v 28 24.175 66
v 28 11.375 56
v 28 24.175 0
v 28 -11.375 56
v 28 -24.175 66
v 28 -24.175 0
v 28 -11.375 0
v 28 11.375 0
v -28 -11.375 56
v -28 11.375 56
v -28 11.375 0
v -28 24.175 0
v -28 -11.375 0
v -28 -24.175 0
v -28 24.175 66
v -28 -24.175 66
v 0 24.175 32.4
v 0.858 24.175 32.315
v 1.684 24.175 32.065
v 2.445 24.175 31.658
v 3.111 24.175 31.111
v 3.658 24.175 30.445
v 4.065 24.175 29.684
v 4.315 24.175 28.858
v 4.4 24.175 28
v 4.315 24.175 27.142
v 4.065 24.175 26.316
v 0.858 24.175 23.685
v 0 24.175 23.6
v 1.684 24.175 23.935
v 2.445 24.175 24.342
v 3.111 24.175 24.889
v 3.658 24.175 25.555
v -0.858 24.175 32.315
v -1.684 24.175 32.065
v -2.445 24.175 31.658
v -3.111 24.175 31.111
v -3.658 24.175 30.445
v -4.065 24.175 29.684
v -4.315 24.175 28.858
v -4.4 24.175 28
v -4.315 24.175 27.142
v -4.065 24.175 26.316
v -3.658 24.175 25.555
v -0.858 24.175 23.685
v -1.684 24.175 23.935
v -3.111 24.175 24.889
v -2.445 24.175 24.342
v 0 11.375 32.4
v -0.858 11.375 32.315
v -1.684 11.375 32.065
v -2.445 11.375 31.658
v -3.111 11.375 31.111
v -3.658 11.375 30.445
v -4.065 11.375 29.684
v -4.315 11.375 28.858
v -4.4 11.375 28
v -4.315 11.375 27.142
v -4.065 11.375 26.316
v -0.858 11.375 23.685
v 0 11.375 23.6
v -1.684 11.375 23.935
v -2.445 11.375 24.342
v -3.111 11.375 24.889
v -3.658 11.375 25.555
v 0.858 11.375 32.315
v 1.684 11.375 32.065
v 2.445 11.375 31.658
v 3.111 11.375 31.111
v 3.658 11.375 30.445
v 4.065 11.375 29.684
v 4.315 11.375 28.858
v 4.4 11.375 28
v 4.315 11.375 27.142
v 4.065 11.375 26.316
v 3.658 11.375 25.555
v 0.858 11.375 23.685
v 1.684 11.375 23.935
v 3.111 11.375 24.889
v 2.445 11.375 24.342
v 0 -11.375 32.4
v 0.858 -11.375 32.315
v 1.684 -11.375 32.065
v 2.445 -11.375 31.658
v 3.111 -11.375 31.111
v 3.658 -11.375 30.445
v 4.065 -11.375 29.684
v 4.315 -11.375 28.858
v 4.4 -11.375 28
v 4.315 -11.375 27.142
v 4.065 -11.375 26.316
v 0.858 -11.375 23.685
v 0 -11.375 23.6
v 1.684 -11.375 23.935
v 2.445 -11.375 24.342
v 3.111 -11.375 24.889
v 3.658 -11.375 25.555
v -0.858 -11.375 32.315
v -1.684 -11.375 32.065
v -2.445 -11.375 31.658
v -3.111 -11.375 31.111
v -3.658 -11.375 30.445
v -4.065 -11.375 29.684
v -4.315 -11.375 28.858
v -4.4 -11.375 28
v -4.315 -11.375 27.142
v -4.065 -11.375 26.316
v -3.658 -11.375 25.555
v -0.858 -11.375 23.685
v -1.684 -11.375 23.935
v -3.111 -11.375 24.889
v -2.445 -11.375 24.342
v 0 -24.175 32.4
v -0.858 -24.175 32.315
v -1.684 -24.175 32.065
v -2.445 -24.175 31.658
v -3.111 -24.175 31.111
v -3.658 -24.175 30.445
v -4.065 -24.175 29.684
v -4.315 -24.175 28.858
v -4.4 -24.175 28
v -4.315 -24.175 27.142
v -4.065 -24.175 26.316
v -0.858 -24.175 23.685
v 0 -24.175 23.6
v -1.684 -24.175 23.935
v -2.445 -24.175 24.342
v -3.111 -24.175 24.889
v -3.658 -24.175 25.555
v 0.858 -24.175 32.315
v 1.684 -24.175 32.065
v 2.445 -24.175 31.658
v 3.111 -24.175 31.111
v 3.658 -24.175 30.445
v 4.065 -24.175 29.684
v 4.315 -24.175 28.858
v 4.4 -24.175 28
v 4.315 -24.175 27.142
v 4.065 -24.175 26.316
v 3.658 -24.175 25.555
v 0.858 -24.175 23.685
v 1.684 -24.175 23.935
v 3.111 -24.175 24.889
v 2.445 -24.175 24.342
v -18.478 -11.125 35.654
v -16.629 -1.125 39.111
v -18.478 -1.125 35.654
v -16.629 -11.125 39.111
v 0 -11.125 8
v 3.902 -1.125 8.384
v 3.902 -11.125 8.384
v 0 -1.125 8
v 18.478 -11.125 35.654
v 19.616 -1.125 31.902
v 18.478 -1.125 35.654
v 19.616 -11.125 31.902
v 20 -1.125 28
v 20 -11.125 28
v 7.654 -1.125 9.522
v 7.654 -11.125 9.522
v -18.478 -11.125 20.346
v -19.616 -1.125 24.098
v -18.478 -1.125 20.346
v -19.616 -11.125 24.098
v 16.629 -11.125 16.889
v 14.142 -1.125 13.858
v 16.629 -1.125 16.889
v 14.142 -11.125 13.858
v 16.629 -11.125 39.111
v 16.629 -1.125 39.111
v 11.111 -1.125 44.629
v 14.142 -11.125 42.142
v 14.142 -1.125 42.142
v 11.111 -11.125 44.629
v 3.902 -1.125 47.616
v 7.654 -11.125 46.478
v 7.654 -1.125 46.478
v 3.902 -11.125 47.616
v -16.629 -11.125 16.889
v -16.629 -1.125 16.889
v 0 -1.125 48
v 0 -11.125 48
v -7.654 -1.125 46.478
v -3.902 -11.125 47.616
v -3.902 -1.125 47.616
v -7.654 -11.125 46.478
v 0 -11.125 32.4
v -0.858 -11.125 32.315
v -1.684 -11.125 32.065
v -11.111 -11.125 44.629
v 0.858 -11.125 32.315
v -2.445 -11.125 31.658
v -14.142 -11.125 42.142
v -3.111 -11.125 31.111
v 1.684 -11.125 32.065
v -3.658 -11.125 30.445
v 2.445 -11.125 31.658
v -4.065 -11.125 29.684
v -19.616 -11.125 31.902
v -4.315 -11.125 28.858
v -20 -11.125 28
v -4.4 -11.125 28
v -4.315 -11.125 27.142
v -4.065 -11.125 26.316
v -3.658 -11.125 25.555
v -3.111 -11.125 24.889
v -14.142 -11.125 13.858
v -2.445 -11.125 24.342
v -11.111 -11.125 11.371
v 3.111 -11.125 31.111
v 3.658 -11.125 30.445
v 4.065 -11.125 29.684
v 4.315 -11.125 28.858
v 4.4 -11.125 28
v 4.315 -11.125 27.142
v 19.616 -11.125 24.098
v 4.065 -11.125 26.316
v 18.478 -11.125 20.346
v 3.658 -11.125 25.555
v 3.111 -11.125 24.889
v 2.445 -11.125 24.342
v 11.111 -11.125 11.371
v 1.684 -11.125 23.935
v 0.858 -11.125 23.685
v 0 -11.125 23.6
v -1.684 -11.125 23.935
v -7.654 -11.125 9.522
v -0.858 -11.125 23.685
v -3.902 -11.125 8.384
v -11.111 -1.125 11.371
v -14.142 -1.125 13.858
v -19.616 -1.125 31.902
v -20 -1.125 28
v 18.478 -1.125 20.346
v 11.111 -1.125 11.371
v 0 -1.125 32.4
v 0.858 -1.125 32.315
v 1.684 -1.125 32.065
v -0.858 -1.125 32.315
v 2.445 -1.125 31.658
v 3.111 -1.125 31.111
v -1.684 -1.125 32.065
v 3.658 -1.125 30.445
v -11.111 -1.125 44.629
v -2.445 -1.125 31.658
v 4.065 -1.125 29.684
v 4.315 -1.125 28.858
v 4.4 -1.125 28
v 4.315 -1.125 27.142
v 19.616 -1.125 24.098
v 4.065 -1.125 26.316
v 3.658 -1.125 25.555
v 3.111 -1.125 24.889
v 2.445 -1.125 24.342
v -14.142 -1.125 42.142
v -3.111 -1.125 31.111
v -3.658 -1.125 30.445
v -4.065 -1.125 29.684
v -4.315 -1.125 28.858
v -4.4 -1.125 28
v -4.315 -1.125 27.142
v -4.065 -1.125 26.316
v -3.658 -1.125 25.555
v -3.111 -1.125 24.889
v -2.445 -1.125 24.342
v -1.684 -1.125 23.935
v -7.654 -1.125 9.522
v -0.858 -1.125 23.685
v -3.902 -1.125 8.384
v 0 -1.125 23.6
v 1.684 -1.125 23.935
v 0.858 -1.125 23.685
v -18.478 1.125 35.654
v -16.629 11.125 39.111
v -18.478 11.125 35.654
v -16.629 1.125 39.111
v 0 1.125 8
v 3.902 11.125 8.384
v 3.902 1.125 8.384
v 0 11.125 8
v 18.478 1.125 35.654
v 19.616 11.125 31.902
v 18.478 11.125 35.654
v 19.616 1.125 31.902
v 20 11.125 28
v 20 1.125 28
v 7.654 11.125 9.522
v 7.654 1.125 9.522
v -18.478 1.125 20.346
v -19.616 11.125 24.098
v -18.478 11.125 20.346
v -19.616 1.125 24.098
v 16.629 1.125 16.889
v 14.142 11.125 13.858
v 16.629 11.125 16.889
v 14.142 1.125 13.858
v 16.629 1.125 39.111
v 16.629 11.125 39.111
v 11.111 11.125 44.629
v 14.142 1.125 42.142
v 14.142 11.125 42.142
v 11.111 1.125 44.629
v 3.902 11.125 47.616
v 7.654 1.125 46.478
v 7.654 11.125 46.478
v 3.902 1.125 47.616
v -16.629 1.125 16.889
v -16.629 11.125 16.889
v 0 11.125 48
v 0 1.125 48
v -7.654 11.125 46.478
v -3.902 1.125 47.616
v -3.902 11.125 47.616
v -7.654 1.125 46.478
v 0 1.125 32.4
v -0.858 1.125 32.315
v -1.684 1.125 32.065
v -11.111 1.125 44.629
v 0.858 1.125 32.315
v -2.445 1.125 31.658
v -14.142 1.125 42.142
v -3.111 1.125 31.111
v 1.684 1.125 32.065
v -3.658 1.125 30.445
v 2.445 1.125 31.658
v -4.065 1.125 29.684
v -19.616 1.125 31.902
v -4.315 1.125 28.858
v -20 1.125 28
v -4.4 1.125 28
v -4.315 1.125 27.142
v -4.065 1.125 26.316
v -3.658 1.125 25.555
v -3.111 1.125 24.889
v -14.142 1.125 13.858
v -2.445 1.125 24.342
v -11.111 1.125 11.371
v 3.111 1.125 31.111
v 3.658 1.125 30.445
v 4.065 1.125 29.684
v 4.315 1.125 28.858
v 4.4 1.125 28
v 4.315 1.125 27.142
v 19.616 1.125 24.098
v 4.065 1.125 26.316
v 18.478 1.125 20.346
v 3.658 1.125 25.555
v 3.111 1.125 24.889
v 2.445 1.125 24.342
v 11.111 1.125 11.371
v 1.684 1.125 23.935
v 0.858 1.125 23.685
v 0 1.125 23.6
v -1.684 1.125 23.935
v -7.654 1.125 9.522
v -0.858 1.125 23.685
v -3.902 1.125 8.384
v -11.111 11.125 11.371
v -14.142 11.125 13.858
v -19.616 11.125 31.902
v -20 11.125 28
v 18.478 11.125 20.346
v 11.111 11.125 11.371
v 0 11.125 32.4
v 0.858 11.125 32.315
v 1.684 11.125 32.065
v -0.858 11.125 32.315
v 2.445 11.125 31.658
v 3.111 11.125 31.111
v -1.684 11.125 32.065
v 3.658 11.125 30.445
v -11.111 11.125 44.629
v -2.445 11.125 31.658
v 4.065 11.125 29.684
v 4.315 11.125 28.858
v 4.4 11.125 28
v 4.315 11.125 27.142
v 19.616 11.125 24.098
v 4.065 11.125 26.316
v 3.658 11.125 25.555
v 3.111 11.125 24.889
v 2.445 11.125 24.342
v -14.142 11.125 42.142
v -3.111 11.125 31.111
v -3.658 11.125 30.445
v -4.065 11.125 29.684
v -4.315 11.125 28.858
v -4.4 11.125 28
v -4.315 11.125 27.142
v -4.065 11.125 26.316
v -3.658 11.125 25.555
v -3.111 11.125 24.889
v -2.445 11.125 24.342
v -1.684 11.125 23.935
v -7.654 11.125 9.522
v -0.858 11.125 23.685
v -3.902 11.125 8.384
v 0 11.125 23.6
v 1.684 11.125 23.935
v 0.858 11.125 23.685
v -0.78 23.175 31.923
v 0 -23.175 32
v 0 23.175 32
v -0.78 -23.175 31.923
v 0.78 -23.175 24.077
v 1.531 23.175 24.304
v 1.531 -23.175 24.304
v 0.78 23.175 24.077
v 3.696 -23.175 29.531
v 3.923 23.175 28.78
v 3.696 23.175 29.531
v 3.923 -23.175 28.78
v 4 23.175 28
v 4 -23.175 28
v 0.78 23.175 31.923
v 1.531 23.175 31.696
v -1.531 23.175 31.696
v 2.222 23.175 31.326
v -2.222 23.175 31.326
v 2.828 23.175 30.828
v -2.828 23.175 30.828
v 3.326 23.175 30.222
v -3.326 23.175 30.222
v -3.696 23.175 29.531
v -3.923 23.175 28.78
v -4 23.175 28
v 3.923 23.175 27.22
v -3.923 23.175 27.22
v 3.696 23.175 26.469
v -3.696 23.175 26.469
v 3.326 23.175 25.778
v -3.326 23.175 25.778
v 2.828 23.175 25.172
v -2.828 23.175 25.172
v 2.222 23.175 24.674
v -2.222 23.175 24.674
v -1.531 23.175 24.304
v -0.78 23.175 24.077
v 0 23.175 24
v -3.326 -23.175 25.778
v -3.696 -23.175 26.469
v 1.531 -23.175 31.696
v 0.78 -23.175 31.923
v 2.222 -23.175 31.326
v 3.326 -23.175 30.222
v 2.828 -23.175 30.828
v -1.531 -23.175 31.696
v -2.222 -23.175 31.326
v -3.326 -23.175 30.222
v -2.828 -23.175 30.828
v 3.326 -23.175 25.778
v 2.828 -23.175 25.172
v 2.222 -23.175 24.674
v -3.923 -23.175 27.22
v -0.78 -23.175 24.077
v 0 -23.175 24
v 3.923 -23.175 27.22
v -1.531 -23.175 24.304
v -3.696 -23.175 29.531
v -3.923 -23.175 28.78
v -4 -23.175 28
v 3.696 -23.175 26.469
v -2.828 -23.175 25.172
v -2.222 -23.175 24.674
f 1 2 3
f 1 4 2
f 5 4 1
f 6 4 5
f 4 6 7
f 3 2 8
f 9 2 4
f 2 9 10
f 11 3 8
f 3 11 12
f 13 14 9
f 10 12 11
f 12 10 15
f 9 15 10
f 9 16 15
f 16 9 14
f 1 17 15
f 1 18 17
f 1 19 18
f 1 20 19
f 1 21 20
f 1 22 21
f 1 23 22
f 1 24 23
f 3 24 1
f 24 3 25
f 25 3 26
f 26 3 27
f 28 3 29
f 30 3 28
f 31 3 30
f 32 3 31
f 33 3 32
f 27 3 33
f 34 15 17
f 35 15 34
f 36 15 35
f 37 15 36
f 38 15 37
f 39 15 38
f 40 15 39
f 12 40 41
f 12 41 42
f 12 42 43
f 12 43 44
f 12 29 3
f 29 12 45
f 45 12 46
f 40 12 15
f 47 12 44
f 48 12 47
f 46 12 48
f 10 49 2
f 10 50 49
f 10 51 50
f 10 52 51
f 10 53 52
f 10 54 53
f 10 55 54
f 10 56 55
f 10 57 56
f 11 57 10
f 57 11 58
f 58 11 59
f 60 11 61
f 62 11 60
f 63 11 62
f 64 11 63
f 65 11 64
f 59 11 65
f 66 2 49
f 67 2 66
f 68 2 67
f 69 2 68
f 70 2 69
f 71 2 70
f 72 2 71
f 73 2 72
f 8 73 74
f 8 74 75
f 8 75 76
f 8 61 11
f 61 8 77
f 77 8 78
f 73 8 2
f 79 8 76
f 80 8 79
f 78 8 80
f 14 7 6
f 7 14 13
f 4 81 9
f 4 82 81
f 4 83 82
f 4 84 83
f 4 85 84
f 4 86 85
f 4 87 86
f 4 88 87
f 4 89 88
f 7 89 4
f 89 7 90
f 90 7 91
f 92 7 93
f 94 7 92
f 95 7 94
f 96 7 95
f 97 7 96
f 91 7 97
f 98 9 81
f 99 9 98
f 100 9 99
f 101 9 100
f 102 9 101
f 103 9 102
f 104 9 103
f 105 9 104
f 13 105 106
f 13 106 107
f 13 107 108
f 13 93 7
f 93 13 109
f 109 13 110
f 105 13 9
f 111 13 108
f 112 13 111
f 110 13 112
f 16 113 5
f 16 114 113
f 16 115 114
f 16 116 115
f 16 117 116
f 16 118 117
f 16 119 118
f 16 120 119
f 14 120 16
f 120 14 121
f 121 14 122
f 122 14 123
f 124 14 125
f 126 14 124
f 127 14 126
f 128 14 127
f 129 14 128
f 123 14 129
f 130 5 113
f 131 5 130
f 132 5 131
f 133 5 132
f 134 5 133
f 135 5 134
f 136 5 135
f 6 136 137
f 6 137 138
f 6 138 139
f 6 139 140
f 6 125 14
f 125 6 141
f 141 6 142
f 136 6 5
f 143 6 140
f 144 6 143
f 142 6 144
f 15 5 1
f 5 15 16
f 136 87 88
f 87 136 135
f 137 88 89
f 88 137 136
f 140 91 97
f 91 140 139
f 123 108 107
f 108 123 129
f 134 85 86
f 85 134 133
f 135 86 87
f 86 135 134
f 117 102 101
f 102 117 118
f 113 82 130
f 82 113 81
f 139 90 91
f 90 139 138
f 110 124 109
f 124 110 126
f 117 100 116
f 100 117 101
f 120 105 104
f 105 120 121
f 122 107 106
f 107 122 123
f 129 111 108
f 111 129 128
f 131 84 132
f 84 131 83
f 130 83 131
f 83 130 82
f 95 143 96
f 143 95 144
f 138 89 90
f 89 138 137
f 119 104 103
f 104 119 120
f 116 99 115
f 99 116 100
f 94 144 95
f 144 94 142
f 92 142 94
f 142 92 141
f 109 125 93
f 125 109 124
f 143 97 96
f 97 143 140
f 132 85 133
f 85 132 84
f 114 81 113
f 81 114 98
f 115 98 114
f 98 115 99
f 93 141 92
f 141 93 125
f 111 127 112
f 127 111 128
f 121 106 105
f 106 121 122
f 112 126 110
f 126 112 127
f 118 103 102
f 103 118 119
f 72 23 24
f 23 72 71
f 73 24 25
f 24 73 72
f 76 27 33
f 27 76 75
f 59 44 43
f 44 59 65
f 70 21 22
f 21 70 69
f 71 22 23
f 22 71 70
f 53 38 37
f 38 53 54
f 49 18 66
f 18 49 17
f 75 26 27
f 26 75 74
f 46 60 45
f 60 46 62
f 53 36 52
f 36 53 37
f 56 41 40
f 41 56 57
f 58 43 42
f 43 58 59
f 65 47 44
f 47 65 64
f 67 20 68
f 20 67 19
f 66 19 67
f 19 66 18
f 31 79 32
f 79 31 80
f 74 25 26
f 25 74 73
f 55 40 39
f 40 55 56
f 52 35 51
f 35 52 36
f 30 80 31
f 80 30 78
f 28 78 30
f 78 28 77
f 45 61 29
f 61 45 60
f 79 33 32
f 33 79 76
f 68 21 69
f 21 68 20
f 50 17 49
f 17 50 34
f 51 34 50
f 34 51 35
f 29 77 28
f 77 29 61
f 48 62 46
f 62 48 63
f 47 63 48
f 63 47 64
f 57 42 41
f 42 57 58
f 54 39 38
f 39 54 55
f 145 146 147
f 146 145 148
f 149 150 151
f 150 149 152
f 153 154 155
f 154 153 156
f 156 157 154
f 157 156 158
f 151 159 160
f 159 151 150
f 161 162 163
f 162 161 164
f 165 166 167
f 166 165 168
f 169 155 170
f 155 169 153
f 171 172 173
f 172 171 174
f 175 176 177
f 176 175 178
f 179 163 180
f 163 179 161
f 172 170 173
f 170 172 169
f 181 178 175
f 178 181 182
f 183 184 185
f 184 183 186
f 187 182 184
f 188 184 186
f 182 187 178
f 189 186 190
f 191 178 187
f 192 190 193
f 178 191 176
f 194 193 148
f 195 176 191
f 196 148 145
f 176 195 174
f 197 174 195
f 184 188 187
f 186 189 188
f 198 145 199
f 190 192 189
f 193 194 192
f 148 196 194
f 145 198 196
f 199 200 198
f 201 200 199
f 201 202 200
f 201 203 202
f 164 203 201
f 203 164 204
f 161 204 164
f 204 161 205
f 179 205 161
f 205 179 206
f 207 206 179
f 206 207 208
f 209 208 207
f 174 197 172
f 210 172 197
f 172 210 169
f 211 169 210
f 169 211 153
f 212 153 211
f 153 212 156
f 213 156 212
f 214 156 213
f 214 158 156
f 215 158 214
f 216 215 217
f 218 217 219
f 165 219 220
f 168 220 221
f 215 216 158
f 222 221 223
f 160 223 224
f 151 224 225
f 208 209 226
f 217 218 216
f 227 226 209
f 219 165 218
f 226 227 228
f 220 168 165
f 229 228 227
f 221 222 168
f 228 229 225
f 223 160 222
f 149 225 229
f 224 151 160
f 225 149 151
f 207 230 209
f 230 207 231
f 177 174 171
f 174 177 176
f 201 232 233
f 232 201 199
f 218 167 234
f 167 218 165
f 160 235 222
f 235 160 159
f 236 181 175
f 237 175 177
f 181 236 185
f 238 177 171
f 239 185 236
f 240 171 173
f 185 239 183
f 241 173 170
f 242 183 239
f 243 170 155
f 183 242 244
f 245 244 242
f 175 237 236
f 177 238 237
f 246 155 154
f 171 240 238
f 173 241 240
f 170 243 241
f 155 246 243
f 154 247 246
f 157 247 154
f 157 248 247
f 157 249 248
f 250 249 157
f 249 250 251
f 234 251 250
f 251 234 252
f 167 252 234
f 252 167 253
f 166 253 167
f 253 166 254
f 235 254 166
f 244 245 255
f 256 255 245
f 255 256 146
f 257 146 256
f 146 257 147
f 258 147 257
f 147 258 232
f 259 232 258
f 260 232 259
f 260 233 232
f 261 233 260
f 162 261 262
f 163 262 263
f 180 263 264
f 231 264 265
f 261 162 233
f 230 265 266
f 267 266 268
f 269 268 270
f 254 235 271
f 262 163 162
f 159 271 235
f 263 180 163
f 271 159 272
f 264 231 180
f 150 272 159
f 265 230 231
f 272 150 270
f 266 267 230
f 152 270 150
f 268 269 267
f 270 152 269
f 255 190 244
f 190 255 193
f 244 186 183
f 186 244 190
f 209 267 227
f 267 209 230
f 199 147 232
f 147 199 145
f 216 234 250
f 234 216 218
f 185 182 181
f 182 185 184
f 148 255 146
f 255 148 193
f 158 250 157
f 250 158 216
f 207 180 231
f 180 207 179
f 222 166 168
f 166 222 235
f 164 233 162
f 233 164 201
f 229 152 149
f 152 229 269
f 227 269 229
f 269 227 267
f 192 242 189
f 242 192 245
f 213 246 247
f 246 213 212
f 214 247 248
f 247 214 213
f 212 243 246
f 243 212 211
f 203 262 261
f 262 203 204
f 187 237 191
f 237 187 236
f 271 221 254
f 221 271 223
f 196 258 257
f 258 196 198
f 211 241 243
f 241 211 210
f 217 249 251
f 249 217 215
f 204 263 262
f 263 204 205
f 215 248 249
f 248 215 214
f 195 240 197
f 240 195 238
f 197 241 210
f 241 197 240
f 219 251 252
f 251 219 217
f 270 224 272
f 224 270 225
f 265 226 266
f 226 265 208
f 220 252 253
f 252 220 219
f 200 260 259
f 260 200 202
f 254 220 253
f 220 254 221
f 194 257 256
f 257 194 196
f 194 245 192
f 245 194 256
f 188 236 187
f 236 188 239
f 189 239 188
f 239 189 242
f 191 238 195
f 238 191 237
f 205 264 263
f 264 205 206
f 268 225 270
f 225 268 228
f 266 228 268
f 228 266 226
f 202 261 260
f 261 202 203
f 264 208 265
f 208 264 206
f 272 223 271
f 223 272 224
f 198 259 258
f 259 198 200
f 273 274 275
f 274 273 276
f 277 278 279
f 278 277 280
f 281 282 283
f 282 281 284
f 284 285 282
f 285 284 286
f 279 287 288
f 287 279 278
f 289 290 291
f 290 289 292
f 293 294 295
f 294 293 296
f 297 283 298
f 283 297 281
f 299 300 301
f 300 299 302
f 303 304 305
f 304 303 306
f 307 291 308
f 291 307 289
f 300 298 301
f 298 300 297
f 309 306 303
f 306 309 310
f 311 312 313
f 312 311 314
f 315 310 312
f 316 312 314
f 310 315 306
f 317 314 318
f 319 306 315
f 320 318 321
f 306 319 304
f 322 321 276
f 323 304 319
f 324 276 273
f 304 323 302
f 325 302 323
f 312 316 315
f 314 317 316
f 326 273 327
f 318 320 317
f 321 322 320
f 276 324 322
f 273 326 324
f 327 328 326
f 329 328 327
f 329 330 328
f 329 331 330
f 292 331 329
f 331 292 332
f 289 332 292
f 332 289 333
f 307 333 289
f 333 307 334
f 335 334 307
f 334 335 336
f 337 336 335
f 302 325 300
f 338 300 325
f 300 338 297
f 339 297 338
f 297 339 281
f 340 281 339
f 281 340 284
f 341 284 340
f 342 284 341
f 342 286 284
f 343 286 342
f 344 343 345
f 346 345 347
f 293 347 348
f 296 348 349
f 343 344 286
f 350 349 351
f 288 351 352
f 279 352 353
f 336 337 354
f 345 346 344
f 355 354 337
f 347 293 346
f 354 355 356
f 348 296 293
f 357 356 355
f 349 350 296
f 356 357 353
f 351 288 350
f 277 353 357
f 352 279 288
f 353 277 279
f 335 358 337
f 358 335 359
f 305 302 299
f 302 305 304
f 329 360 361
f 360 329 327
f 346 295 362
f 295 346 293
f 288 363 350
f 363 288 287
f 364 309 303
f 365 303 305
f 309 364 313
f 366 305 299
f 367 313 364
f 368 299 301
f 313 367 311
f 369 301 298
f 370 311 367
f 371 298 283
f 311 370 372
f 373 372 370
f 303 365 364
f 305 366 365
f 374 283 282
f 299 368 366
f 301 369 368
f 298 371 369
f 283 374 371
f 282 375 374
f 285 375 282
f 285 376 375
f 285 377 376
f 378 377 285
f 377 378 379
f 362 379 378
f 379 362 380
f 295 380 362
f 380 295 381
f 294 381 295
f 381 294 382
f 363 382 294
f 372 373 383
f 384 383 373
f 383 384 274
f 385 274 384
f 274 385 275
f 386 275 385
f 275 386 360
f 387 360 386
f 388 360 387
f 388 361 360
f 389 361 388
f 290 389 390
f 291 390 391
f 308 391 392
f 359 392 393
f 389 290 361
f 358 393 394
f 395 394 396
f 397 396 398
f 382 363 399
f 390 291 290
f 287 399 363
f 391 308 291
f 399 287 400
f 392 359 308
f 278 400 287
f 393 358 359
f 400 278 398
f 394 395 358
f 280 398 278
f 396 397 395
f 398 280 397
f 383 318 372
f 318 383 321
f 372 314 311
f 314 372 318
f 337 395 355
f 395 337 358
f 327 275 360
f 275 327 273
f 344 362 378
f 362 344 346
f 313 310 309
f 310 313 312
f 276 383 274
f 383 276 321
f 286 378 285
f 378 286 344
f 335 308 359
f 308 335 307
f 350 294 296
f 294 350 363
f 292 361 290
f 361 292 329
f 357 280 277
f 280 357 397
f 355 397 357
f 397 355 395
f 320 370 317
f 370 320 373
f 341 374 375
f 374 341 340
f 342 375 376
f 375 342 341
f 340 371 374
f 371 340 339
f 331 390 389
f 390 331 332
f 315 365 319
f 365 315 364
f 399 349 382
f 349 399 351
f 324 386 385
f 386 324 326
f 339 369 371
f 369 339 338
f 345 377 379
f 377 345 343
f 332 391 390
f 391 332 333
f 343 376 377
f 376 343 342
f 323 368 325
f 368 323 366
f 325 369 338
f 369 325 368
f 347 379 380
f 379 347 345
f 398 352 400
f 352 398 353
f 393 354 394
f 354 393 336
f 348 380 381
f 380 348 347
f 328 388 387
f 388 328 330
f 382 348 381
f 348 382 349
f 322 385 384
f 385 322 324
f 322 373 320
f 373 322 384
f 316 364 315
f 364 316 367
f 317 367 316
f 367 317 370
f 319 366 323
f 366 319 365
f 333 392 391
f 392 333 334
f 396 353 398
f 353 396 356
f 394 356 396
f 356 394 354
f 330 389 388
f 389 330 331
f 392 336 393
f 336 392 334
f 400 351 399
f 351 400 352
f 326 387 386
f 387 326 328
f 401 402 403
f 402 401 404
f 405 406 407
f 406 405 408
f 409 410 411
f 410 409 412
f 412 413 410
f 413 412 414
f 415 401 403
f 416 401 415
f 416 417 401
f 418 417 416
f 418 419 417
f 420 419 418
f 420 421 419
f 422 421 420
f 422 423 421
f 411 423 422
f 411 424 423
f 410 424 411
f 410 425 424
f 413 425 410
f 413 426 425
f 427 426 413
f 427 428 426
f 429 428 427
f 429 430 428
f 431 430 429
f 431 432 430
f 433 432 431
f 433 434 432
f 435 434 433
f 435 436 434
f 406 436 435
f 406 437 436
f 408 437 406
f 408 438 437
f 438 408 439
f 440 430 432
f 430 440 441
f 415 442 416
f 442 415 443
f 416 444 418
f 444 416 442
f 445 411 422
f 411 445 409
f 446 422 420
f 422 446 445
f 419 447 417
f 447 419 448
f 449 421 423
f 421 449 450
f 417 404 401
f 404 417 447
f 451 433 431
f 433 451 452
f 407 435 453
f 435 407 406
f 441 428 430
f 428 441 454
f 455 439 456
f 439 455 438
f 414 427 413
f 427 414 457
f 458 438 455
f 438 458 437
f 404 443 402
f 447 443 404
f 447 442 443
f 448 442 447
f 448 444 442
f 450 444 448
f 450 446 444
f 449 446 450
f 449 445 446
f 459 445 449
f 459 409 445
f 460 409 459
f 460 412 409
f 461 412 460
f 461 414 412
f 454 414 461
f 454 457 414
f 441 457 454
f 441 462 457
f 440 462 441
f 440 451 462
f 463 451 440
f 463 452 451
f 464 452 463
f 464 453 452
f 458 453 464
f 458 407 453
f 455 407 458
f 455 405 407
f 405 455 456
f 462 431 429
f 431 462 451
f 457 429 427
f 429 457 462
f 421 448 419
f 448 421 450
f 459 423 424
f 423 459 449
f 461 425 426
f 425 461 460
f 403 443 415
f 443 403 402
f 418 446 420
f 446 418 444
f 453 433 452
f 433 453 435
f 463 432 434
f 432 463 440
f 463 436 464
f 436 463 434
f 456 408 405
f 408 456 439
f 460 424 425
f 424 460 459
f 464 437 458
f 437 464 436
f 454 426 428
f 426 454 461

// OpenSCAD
$fn = 32;

// ------------------------------------------------------------------------
// Trolley wheel set: wheels d40, fork 56 mm tall
// Every part is its own module, assembly() places every instance.
// ------------------------------------------------------------------------

// --- part 1 ---
module trolley_fork() {
  difference() {
    union() {
      translate([-28, 11.375, 0]) cube([56, 12.8, 56]);
      translate([-28, -24.175, 0]) cube([56, 12.8, 56]);
      translate([-28, -24.175, 56]) cube([56, 48.35, 10]);
    }
    translate([0, -17.775, 28]) rotate([90, 0, 0]) cylinder(h = 14.8, d = 8.8, center = true);
    translate([0, 17.775, 28]) rotate([90, 0, 0]) cylinder(h = 14.8, d = 8.8, center = true);
  }
}

// --- part 2 ---
module trolley_wheel() {
  difference() {
      translate([0, 0, 0]) cylinder(h = 10, d = 40);
      translate([0, 0, -1]) cylinder(h = 12, d = 8.8);
    }
}

// --- part 3 ---
module trolley_axle() {
  translate([0, 0, -23.175]) cylinder(h = 46.35, d = 8);
}

// --- assembly ---
module assembly() {
  color([0.80, 0.24, 0.20]) translate([0, 0, 0]) rotate([0, 0, 0]) trolley_fork();
  color([0.20, 0.45, 0.75]) translate([0, -1.125, 28]) rotate([90, 0, 0]) trolley_wheel();
  color([0.25, 0.62, 0.32]) translate([0, 11.125, 28]) rotate([90, 0, 0]) trolley_wheel();
  color([0.92, 0.70, 0.18]) translate([0, 0, 28]) rotate([90, 0, 0]) trolley_axle();
}

assembly();
